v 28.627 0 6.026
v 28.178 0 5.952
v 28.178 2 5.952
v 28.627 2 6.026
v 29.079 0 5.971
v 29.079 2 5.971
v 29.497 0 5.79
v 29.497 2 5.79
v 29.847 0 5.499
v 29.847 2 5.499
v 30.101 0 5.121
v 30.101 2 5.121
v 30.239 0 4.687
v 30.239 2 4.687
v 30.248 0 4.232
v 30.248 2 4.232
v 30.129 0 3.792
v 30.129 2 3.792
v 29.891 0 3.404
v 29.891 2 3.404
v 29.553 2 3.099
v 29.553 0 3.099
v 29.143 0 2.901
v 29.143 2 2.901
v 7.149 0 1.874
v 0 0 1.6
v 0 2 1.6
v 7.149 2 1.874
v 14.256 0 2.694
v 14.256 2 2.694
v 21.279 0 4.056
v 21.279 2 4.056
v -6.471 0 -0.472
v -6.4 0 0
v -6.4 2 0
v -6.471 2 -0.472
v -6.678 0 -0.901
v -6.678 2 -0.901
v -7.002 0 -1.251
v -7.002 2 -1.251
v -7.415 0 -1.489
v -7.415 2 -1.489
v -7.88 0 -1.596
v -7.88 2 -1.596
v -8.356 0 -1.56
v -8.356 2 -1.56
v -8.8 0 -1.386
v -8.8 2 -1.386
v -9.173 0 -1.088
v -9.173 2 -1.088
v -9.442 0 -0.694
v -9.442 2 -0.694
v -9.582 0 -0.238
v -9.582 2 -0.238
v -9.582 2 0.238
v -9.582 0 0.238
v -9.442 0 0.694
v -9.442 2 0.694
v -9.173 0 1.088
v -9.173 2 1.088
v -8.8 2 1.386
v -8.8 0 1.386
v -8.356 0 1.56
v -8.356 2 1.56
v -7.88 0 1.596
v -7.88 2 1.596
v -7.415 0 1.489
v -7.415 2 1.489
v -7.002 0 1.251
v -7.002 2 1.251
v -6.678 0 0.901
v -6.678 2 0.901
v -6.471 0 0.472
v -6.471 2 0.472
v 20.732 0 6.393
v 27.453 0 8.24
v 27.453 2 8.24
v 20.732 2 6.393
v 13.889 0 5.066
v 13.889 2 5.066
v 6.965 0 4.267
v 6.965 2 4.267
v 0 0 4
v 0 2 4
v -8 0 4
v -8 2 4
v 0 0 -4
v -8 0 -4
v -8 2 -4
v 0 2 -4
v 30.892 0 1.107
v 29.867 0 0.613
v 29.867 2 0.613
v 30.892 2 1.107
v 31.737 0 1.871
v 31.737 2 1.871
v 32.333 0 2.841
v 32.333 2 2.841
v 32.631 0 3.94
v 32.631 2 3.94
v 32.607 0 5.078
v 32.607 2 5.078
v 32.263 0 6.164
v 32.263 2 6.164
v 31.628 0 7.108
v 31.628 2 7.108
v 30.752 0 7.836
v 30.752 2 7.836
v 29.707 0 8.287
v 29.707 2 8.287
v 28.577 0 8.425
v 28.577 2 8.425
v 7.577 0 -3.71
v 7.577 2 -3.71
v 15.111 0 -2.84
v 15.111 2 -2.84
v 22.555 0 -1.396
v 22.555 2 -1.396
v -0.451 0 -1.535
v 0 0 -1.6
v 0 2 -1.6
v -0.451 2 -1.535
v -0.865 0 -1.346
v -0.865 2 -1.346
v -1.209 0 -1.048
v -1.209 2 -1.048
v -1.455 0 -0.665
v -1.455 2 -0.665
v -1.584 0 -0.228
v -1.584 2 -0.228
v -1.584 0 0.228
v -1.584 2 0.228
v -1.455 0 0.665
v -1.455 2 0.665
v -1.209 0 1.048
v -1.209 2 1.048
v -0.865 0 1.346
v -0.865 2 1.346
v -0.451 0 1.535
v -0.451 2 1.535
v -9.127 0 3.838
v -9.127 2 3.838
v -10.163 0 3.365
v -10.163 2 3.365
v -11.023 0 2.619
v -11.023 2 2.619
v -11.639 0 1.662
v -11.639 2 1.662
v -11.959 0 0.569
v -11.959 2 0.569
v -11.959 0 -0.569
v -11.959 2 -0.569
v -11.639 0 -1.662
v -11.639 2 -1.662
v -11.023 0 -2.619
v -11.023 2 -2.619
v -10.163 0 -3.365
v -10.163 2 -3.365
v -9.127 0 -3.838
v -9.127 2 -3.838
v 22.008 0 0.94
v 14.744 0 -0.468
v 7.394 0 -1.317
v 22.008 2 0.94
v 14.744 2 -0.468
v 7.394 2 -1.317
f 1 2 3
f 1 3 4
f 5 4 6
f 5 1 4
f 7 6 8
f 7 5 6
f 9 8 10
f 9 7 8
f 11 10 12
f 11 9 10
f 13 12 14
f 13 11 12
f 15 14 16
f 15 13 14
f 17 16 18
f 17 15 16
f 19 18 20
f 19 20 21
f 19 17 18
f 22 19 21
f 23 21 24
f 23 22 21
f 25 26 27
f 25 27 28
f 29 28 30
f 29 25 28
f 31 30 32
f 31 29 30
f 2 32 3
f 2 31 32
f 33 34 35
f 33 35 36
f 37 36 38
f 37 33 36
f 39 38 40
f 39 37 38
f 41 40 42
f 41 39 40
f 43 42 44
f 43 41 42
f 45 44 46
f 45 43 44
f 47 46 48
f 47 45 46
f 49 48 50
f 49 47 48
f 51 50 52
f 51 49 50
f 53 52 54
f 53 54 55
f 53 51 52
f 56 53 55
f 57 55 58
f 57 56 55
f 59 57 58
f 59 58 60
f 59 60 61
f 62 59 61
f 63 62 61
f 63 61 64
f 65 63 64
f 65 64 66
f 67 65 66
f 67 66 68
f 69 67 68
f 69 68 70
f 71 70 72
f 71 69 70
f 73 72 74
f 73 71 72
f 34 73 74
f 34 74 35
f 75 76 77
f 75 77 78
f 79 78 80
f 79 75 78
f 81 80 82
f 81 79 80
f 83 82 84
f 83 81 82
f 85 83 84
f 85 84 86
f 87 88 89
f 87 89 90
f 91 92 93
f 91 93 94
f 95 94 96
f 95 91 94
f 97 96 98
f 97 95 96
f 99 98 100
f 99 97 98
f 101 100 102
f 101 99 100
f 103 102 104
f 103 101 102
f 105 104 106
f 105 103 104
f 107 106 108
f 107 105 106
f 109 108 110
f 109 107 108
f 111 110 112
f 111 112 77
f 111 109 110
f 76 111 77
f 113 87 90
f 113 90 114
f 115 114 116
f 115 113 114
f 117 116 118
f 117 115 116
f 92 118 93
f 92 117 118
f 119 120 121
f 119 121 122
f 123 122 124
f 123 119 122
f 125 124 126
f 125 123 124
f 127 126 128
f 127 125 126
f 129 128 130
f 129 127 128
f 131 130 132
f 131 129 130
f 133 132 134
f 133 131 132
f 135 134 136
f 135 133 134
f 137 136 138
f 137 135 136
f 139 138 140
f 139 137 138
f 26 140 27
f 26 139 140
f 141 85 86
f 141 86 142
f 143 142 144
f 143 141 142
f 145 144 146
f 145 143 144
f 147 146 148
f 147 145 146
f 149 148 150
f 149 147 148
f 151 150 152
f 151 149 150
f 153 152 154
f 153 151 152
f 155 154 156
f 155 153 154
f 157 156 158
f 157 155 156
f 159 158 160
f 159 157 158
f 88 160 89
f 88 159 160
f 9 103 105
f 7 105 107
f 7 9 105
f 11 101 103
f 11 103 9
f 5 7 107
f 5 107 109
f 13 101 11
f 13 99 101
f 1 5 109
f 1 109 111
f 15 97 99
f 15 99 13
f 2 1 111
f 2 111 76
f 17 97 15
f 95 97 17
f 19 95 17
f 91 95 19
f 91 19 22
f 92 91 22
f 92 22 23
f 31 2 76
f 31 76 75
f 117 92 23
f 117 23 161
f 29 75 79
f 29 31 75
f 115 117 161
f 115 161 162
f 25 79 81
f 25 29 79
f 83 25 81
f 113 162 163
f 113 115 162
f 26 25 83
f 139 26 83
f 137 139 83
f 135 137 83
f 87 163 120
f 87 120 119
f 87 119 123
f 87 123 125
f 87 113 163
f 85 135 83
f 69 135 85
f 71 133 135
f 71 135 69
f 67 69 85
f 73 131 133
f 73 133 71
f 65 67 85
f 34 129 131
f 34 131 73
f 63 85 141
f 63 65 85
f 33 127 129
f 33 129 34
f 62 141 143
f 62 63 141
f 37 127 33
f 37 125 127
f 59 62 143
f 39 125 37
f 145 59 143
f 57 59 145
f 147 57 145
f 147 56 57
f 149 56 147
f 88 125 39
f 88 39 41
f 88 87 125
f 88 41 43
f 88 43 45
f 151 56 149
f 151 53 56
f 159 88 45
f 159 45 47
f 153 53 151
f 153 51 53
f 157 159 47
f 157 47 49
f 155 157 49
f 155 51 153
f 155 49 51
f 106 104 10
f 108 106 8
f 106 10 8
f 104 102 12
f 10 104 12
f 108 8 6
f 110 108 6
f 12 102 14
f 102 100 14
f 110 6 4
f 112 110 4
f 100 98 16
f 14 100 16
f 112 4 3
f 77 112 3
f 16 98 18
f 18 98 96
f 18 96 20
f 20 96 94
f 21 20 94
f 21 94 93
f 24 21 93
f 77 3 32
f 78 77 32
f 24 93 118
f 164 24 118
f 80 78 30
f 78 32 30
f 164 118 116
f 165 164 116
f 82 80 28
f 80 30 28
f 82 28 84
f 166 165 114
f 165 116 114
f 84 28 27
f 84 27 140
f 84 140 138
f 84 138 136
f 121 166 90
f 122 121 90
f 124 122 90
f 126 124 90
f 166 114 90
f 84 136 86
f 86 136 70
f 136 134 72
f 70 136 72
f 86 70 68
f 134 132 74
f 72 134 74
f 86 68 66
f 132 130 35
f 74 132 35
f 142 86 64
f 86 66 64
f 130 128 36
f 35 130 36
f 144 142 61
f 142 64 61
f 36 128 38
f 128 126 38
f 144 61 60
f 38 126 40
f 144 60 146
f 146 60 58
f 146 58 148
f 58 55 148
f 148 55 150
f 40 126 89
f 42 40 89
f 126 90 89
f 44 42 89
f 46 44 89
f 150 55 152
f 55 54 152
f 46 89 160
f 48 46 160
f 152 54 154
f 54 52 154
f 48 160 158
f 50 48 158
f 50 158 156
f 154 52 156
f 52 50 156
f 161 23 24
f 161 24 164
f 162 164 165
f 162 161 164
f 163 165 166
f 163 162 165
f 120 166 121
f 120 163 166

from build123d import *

# Parameters (mm, degrees)
SKETCH_2_R      = 1.6
EXTRUDE_1_DEPTH = 2


with BuildPart() as part:
    # 草图2 → 凸台-拉伸1 (new body)
    with BuildSketch(Plane(origin=(0, 0, 0), x_dir=(1, 0, 0), z_dir=(0, 1, 0))):
        with BuildLine():
            Line((-8, 4), (0, 4))
            ThreePointArc((0, 4), (15.110526316, 2.840032678), (29.866957344, -0.612686981))
            ThreePointArc((29.866957344, -0.612686981), (32.473840401, -5.633061541), (27.453465841, -8.239944598))
            ThreePointArc((27.453465841, -8.239944598), (13.889473684, -5.066232589), (0, -4))
            Line((0, -4), (-8, -4))
            ThreePointArc((-8, -4), (-12, 0), (-8, 4))
        make_face()
        with Locations((-8, 0)):
            Circle(SKETCH_2_R, mode=Mode.SUBTRACT)
        with BuildLine():
            ThreePointArc((29.142909893, -2.900864266), (14.744210526, 0.468153098), (0, 1.6))
            ThreePointArc((0, 1.6), (-1.6, 0), (0, -1.6))
            ThreePointArc((0, -1.6), (14.255789474, -2.694353009), (28.177513292, -5.951767313))
            ThreePointArc((28.177513292, -5.951767313), (30.185663116, -4.90901409), (29.142909893, -2.900864266))
        make_face(mode=Mode.SUBTRACT)
    extrude(amount=EXTRUDE_1_DEPTH)


solid = part.part
